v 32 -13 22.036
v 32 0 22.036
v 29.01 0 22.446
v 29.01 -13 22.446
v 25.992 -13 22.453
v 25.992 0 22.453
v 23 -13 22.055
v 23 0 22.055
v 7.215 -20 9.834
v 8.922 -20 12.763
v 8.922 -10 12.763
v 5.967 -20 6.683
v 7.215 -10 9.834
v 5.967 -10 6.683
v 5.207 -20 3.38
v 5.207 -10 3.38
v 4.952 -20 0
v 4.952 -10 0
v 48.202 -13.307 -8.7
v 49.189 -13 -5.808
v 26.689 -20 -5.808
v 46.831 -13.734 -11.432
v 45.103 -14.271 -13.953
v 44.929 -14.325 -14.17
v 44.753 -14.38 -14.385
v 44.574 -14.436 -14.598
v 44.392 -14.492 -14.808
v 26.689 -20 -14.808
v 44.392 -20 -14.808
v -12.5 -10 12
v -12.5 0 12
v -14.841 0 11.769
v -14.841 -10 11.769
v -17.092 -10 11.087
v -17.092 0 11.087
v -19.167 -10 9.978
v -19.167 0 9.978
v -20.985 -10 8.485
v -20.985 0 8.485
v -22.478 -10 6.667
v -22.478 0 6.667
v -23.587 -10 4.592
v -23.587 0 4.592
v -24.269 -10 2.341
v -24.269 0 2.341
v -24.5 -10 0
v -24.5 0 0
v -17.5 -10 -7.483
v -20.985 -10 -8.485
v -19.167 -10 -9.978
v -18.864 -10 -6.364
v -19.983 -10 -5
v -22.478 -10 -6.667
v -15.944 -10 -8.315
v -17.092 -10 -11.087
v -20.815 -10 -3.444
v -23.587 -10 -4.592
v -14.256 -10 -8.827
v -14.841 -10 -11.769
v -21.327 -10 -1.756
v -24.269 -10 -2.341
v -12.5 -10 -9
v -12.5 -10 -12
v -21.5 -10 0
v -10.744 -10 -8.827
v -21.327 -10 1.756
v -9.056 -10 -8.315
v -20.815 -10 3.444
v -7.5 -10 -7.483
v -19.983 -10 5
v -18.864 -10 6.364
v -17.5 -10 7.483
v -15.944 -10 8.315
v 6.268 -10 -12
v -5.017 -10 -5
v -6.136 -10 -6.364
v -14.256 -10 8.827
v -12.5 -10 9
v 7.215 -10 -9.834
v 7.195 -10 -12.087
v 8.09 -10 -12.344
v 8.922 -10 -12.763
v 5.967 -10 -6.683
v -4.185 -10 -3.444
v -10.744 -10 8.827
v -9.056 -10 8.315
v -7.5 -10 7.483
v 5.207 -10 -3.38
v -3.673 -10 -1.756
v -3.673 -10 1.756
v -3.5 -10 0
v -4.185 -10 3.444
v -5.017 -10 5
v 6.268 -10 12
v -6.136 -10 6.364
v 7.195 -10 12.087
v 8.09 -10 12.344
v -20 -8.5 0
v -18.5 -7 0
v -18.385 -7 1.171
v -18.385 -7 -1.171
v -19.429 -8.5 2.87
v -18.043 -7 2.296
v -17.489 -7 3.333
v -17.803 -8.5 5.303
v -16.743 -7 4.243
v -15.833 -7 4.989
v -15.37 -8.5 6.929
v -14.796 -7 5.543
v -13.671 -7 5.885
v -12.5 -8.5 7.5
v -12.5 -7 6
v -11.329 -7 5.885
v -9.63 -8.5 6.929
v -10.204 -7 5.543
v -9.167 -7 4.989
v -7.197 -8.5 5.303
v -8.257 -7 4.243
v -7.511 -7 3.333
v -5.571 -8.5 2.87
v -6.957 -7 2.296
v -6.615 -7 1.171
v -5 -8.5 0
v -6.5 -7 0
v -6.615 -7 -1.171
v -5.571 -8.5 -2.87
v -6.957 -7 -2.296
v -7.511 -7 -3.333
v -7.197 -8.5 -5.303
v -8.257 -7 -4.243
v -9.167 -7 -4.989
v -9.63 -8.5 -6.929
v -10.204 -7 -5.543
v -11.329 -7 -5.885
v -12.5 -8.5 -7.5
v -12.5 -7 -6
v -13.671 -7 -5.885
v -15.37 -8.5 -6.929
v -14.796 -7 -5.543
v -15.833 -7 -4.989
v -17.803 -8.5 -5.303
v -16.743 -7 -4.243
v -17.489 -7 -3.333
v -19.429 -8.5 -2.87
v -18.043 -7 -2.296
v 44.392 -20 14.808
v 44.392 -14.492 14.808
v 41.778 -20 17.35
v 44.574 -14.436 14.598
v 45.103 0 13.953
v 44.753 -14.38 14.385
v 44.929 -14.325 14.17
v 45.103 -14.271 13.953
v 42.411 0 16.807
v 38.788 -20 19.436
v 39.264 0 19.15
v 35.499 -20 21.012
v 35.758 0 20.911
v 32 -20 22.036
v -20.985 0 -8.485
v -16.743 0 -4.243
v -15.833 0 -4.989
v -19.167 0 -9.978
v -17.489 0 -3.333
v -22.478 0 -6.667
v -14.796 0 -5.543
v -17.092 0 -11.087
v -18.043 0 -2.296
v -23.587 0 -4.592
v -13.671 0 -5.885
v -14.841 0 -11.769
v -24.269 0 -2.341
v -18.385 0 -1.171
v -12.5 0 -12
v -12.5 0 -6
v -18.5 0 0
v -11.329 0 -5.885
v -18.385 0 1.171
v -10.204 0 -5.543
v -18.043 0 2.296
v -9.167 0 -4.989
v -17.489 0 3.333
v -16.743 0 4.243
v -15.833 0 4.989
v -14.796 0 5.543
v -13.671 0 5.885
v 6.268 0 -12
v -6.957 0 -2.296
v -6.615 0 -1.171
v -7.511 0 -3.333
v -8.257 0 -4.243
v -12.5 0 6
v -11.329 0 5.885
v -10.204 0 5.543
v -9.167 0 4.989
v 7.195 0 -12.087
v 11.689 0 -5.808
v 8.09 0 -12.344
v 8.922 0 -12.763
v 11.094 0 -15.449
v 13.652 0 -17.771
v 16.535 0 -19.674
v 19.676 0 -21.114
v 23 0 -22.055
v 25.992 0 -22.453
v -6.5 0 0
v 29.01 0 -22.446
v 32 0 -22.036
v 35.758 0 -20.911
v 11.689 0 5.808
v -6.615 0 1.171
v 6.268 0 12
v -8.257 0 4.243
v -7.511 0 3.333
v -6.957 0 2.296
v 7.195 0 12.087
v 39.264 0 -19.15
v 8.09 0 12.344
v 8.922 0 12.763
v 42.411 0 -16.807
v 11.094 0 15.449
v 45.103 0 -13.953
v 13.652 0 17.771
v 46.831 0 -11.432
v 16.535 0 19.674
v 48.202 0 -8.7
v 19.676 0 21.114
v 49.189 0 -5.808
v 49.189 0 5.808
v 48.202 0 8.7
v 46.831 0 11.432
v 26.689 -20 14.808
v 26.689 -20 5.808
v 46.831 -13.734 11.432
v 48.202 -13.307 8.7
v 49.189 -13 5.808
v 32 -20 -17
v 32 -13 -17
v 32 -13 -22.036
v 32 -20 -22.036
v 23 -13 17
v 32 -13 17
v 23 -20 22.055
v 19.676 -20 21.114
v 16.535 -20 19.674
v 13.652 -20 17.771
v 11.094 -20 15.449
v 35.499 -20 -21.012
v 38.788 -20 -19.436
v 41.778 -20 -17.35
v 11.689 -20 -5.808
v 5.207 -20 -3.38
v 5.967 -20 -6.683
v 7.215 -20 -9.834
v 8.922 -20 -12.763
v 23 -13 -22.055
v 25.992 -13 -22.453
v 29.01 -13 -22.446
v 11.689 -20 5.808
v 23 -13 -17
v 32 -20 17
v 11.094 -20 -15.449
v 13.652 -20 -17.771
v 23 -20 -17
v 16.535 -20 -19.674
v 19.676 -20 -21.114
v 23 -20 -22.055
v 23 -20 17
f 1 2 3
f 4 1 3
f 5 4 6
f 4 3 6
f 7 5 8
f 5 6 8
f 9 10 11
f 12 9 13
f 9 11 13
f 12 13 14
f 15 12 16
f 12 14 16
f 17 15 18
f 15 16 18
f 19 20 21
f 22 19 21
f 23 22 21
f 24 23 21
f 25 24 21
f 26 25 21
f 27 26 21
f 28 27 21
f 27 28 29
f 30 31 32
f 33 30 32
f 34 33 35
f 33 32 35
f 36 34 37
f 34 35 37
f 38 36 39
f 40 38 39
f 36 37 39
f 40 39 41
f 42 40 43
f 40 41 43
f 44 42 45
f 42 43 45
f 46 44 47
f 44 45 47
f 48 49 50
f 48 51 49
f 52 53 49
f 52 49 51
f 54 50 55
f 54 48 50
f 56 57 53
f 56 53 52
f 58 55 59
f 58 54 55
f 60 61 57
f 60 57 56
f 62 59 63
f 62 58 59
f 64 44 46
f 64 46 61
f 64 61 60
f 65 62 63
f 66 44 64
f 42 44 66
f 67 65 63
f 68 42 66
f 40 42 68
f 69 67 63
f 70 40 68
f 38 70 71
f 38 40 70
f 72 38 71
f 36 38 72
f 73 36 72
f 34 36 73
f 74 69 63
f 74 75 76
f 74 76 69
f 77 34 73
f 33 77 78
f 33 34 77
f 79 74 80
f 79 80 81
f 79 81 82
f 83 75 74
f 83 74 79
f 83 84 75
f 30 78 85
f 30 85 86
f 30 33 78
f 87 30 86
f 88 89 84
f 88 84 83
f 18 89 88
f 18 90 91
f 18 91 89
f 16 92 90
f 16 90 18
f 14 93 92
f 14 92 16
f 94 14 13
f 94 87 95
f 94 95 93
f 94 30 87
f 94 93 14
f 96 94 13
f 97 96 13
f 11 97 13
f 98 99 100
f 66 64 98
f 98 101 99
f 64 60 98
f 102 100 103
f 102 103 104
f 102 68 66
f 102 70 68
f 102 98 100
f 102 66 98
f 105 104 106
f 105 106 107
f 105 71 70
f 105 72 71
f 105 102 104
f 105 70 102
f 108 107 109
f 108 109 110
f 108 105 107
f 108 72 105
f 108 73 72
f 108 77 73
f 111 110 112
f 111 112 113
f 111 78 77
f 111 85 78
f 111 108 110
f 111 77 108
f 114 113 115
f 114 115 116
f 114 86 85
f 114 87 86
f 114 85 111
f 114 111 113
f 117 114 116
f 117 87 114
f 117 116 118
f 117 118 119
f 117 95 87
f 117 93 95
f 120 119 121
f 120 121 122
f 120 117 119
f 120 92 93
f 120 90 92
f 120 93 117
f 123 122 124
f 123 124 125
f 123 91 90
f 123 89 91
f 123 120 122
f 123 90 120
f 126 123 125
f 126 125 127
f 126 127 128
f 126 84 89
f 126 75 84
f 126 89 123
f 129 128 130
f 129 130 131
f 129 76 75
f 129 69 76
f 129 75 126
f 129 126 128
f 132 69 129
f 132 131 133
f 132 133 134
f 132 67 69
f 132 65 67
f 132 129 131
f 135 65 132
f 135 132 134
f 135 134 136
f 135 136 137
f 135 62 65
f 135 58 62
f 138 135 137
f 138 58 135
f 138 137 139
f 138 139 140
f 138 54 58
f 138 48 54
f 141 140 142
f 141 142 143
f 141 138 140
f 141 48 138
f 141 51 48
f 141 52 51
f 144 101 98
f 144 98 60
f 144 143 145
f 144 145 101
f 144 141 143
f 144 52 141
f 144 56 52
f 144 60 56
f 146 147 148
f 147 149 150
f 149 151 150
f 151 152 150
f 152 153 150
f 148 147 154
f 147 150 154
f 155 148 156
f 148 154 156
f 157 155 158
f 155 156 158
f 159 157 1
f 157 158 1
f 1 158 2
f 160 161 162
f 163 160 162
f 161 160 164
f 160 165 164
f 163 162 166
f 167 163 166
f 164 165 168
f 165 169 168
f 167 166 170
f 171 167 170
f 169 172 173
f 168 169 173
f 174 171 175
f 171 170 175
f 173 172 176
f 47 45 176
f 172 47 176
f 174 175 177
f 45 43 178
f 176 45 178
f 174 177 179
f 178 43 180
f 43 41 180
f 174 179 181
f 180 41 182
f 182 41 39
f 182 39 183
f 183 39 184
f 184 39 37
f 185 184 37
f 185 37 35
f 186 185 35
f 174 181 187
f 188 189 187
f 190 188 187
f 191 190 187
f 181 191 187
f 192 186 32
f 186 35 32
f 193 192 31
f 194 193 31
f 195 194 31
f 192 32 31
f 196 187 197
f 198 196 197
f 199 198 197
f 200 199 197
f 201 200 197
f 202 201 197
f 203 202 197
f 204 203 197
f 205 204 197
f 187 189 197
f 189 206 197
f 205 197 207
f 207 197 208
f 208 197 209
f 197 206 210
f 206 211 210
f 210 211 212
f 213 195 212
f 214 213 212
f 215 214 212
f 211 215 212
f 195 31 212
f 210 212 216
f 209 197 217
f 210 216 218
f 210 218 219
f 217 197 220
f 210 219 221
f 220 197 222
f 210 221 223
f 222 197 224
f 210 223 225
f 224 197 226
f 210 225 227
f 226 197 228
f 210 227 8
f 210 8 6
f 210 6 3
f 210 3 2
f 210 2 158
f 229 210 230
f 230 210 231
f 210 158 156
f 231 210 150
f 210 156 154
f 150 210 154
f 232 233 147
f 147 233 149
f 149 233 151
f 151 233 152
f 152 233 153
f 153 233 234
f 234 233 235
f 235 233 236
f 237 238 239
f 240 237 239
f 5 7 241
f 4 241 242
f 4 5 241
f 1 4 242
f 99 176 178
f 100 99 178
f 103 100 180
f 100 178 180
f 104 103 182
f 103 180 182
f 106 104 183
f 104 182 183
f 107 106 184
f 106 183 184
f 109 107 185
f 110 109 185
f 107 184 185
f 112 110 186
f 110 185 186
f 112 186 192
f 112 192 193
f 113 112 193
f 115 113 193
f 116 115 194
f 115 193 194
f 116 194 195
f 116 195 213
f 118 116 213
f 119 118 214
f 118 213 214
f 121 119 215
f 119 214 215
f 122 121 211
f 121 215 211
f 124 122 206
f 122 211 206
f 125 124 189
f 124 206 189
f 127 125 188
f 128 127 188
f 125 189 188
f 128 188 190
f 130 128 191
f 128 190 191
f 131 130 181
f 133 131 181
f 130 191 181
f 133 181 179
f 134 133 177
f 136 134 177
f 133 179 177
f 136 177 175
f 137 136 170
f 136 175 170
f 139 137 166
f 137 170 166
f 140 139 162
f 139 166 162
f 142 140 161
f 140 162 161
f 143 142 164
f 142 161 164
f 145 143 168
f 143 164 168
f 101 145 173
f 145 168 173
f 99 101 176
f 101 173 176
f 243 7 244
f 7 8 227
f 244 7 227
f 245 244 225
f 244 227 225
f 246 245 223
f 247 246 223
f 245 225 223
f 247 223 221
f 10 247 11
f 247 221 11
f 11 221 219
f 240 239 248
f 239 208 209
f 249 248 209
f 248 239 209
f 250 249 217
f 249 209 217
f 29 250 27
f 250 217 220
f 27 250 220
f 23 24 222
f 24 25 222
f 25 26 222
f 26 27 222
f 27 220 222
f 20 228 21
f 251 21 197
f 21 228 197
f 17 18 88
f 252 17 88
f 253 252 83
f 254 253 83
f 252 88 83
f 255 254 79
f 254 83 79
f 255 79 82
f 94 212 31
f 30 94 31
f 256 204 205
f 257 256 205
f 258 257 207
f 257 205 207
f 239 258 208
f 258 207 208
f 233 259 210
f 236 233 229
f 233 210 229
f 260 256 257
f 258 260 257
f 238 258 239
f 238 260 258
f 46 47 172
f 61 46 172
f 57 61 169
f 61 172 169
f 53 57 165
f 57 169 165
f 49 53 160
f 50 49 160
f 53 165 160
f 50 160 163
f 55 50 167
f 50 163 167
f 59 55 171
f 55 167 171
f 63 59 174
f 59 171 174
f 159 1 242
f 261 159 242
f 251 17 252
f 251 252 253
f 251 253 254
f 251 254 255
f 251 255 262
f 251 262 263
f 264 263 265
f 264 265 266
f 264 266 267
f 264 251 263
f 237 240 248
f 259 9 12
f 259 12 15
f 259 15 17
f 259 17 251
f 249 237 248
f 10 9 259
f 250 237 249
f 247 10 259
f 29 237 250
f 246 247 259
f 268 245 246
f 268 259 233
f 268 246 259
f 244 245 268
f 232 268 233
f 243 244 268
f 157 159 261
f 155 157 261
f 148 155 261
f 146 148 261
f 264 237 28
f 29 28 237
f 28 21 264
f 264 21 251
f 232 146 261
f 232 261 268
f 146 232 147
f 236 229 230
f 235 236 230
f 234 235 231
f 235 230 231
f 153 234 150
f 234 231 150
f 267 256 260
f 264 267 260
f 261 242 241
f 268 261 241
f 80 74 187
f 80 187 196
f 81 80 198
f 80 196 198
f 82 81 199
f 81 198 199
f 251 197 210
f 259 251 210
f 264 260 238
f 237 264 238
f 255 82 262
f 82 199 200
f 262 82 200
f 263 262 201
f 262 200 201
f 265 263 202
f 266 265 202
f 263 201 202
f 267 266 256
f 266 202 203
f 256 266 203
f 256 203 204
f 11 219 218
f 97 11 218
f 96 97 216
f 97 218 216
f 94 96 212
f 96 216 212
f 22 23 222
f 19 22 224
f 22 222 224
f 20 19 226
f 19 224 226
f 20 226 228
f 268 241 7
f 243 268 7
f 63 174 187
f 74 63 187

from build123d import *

# Parameters (mm, degrees)
F1_DEPTH = 10
F2_SIZE2 = 3
F2_SIZE  = 3
F3_DEPTH = 20
F4_DEPTH = 13
F6_DEPTH = 9
F8_DEPTH = 9


# Not quite as in the source:
# - after a boolean that leaves OpenCascade's solid faulty, fix() repairs it


with BuildPart() as f1:
    # F0 (on Front) → F1 (new body)
    with BuildSketch(Plane.XZ):
        with BuildLine():
            ThreePointArc((-12.5, 12), (-20.9852813742, 8.4852813742), (-24.5, 0))
            ThreePointArc((-24.5, 0), (-20.9852813742, -8.4852813742), (-12.5, -12))
            Line((-12.5, -12), (6.2676198227, -12))
            ThreePointArc((6.2676198227, -12), (7.6484176342, -12.1944409895), (8.9218219686, -12.7626410385))
            ThreePointArc((8.9218219686, -12.7626410385), (5.9673160107, -6.6829078481), (4.9519324303, 0))
            ThreePointArc((4.9519324303, 0), (5.9673160107, 6.6829078481), (8.9218219686, 12.7626410385))
            ThreePointArc((8.9218219686, 12.7626410385), (7.6484176342, 12.1944409895), (6.2676198227, 12))
            Line((6.2676198227, 12), (-12.5, 12))
        make_face()
        with BuildLine():
            ThreePointArc((-3.5, 0), (-12.5, -9), (-21.5, 0))
            ThreePointArc((-21.5, 0), (-12.5, 9), (-3.5, 0))
        make_face(mode=Mode.SUBTRACT)
        with BuildLine():
            ThreePointArc((-3.5, 0), (-12.5, 9), (-21.5, 0))
            ThreePointArc((-21.5, 0), (-12.5, -9), (-3.5, 0))
        make_face()
        with BuildLine():
            ThreePointArc((-6.5, 0), (-12.5, -6), (-18.5, 0))
            ThreePointArc((-18.5, 0), (-12.5, 6), (-6.5, 0))
        make_face(mode=Mode.SUBTRACT)
    extrude(amount=F1_DEPTH)

    # F2
    f2_edges = [f1.edges().sort_by_distance(p)[0] for p in [
        (-6.5, -10, 0),
    ]]
    chamfer(f2_edges, length=F2_SIZE, length2=F2_SIZE2)

    # F0 (on Front) → F3 (join)
    with BuildSketch(Plane.XZ):
        with BuildLine():
            ThreePointArc((4.9519324303, 0), (5.9673160107, -6.6829078481), (8.9218219686, -12.7626410385))
            ThreePointArc((8.9218219686, -12.7626410385), (15.0571220775, -18.7781435802), (23, -22.0551648744))
            Line((23, -22.0551648744), (23, -17))
            Line((23, -17), (27.5, -17))
            Line((27.5, -17), (32, -17))
            Line((32, -17), (32, -22.0355413226))
            ThreePointArc((32, -22.0355413226), (39.2642294703, -19.1499252907), (45.1029145419, -13.9532372766))
            Line((45.1029145419, -13.9532372766), (27.4519324303, -13.9532372766))
            Line((27.4519324303, -13.9532372766), (27.4519324303, -5.8079371229))
            Line((27.4519324303, -5.8079371229), (11.6894085114, -5.8079371229))
            Line((11.6894085114, -5.8079371229), (11.6894085114, 0))
            Line((11.6894085114, 0), (11.6894085114, 5.8079371229))
            Line((11.6894085114, 5.8079371229), (27.5485839971, 5.8079371229))
            Line((27.5485839971, 5.8079371229), (27.4519324303, 13.9532372766))
            Line((27.4519324303, 13.9532372766), (45.1029145419, 13.9532372766))
            ThreePointArc((45.1029145419, 13.9532372766), (39.2642294703, 19.1499252907), (32, 22.0355413226))
            Line((32, 22.0355413226), (32, 17))
            Line((32, 17), (27.5, 17))
            Line((27.5, 17), (23, 17))
            Line((23, 17), (23, 22.0551648744))
            ThreePointArc((23, 22.0551648744), (15.0571220775, 18.7781435802), (8.9218219686, 12.7626410385))
            ThreePointArc((8.9218219686, 12.7626410385), (5.9673160107, 6.6829078481), (4.9519324303, 0))
        make_face()
        with BuildLine():
            ThreePointArc((49.1894085114, 5.8079371229), (47.562853303, 10.0896413044), (45.1029145419, 13.9532372766))
            Line((45.1029145419, 13.9532372766), (27.4519324303, 13.9532372766))
            Line((27.4519324303, 13.9532372766), (27.5485839971, 5.8079371229))
            Line((27.5485839971, 5.8079371229), (49.1894085114, 5.8079371229))
        make_face()
        with BuildLine():
            Line((27.4519324303, -13.9532372766), (45.1029145419, -13.9532372766))
            ThreePointArc((45.1029145419, -13.9532372766), (47.562853303, -10.0896413044), (49.1894085114, -5.8079371229))
            Line((49.1894085114, -5.8079371229), (27.4519324303, -5.8079371229))
            Line((27.4519324303, -5.8079371229), (27.4519324303, -13.9532372766))
        make_face()
    extrude(amount=F3_DEPTH)

    # F0 (on Front) → F4 (join)
    with BuildSketch(Plane.XZ):
        with BuildLine():
            ThreePointArc((32, 22.0355413226), (27.5009911931, 22.4999465163), (23, 22.0551648744))
            Line((23, 22.0551648744), (23, 17))
            Line((23, 17), (27.5, 17))
            Line((27.5, 17), (32, 17))
            Line((32, 17), (32, 22.0355413226))
        make_face()
        with BuildLine():
            Line((23, -17), (23, -22.0551648744))
            ThreePointArc((23, -22.0551648744), (27.5009911931, -22.4999465163), (32, -22.0355413226))
            Line((32, -22.0355413226), (32, -17))
            Line((32, -17), (27.5, -17))
            Line((27.5, -17), (23, -17))
        make_face()
    extrude(amount=F4_DEPTH)

    # F5 (on face) → F6 (cut)
    with BuildSketch(Plane(origin=(0, 0, 5.8079371229), x_dir=(1, 0, 0), z_dir=(0, 0, -1))):
        Polygon((49.1894085114, 13), (49.1894085114, 20), (26.6894085114, 20), align=None)
    extrude(amount=-F6_DEPTH, mode=Mode.SUBTRACT)

    # F7 (on face) → F8 (cut)
    with BuildSketch(Plane.XY.offset(-5.8079371229)):
        Polygon((26.6894085114, -20), (49.1894085114, -20), (49.1894085114, -13), align=None)
    extrude(amount=-F8_DEPTH, mode=Mode.SUBTRACT)

    add(f1.part.fix(), mode=Mode.REPLACE)


solid = f1.part
